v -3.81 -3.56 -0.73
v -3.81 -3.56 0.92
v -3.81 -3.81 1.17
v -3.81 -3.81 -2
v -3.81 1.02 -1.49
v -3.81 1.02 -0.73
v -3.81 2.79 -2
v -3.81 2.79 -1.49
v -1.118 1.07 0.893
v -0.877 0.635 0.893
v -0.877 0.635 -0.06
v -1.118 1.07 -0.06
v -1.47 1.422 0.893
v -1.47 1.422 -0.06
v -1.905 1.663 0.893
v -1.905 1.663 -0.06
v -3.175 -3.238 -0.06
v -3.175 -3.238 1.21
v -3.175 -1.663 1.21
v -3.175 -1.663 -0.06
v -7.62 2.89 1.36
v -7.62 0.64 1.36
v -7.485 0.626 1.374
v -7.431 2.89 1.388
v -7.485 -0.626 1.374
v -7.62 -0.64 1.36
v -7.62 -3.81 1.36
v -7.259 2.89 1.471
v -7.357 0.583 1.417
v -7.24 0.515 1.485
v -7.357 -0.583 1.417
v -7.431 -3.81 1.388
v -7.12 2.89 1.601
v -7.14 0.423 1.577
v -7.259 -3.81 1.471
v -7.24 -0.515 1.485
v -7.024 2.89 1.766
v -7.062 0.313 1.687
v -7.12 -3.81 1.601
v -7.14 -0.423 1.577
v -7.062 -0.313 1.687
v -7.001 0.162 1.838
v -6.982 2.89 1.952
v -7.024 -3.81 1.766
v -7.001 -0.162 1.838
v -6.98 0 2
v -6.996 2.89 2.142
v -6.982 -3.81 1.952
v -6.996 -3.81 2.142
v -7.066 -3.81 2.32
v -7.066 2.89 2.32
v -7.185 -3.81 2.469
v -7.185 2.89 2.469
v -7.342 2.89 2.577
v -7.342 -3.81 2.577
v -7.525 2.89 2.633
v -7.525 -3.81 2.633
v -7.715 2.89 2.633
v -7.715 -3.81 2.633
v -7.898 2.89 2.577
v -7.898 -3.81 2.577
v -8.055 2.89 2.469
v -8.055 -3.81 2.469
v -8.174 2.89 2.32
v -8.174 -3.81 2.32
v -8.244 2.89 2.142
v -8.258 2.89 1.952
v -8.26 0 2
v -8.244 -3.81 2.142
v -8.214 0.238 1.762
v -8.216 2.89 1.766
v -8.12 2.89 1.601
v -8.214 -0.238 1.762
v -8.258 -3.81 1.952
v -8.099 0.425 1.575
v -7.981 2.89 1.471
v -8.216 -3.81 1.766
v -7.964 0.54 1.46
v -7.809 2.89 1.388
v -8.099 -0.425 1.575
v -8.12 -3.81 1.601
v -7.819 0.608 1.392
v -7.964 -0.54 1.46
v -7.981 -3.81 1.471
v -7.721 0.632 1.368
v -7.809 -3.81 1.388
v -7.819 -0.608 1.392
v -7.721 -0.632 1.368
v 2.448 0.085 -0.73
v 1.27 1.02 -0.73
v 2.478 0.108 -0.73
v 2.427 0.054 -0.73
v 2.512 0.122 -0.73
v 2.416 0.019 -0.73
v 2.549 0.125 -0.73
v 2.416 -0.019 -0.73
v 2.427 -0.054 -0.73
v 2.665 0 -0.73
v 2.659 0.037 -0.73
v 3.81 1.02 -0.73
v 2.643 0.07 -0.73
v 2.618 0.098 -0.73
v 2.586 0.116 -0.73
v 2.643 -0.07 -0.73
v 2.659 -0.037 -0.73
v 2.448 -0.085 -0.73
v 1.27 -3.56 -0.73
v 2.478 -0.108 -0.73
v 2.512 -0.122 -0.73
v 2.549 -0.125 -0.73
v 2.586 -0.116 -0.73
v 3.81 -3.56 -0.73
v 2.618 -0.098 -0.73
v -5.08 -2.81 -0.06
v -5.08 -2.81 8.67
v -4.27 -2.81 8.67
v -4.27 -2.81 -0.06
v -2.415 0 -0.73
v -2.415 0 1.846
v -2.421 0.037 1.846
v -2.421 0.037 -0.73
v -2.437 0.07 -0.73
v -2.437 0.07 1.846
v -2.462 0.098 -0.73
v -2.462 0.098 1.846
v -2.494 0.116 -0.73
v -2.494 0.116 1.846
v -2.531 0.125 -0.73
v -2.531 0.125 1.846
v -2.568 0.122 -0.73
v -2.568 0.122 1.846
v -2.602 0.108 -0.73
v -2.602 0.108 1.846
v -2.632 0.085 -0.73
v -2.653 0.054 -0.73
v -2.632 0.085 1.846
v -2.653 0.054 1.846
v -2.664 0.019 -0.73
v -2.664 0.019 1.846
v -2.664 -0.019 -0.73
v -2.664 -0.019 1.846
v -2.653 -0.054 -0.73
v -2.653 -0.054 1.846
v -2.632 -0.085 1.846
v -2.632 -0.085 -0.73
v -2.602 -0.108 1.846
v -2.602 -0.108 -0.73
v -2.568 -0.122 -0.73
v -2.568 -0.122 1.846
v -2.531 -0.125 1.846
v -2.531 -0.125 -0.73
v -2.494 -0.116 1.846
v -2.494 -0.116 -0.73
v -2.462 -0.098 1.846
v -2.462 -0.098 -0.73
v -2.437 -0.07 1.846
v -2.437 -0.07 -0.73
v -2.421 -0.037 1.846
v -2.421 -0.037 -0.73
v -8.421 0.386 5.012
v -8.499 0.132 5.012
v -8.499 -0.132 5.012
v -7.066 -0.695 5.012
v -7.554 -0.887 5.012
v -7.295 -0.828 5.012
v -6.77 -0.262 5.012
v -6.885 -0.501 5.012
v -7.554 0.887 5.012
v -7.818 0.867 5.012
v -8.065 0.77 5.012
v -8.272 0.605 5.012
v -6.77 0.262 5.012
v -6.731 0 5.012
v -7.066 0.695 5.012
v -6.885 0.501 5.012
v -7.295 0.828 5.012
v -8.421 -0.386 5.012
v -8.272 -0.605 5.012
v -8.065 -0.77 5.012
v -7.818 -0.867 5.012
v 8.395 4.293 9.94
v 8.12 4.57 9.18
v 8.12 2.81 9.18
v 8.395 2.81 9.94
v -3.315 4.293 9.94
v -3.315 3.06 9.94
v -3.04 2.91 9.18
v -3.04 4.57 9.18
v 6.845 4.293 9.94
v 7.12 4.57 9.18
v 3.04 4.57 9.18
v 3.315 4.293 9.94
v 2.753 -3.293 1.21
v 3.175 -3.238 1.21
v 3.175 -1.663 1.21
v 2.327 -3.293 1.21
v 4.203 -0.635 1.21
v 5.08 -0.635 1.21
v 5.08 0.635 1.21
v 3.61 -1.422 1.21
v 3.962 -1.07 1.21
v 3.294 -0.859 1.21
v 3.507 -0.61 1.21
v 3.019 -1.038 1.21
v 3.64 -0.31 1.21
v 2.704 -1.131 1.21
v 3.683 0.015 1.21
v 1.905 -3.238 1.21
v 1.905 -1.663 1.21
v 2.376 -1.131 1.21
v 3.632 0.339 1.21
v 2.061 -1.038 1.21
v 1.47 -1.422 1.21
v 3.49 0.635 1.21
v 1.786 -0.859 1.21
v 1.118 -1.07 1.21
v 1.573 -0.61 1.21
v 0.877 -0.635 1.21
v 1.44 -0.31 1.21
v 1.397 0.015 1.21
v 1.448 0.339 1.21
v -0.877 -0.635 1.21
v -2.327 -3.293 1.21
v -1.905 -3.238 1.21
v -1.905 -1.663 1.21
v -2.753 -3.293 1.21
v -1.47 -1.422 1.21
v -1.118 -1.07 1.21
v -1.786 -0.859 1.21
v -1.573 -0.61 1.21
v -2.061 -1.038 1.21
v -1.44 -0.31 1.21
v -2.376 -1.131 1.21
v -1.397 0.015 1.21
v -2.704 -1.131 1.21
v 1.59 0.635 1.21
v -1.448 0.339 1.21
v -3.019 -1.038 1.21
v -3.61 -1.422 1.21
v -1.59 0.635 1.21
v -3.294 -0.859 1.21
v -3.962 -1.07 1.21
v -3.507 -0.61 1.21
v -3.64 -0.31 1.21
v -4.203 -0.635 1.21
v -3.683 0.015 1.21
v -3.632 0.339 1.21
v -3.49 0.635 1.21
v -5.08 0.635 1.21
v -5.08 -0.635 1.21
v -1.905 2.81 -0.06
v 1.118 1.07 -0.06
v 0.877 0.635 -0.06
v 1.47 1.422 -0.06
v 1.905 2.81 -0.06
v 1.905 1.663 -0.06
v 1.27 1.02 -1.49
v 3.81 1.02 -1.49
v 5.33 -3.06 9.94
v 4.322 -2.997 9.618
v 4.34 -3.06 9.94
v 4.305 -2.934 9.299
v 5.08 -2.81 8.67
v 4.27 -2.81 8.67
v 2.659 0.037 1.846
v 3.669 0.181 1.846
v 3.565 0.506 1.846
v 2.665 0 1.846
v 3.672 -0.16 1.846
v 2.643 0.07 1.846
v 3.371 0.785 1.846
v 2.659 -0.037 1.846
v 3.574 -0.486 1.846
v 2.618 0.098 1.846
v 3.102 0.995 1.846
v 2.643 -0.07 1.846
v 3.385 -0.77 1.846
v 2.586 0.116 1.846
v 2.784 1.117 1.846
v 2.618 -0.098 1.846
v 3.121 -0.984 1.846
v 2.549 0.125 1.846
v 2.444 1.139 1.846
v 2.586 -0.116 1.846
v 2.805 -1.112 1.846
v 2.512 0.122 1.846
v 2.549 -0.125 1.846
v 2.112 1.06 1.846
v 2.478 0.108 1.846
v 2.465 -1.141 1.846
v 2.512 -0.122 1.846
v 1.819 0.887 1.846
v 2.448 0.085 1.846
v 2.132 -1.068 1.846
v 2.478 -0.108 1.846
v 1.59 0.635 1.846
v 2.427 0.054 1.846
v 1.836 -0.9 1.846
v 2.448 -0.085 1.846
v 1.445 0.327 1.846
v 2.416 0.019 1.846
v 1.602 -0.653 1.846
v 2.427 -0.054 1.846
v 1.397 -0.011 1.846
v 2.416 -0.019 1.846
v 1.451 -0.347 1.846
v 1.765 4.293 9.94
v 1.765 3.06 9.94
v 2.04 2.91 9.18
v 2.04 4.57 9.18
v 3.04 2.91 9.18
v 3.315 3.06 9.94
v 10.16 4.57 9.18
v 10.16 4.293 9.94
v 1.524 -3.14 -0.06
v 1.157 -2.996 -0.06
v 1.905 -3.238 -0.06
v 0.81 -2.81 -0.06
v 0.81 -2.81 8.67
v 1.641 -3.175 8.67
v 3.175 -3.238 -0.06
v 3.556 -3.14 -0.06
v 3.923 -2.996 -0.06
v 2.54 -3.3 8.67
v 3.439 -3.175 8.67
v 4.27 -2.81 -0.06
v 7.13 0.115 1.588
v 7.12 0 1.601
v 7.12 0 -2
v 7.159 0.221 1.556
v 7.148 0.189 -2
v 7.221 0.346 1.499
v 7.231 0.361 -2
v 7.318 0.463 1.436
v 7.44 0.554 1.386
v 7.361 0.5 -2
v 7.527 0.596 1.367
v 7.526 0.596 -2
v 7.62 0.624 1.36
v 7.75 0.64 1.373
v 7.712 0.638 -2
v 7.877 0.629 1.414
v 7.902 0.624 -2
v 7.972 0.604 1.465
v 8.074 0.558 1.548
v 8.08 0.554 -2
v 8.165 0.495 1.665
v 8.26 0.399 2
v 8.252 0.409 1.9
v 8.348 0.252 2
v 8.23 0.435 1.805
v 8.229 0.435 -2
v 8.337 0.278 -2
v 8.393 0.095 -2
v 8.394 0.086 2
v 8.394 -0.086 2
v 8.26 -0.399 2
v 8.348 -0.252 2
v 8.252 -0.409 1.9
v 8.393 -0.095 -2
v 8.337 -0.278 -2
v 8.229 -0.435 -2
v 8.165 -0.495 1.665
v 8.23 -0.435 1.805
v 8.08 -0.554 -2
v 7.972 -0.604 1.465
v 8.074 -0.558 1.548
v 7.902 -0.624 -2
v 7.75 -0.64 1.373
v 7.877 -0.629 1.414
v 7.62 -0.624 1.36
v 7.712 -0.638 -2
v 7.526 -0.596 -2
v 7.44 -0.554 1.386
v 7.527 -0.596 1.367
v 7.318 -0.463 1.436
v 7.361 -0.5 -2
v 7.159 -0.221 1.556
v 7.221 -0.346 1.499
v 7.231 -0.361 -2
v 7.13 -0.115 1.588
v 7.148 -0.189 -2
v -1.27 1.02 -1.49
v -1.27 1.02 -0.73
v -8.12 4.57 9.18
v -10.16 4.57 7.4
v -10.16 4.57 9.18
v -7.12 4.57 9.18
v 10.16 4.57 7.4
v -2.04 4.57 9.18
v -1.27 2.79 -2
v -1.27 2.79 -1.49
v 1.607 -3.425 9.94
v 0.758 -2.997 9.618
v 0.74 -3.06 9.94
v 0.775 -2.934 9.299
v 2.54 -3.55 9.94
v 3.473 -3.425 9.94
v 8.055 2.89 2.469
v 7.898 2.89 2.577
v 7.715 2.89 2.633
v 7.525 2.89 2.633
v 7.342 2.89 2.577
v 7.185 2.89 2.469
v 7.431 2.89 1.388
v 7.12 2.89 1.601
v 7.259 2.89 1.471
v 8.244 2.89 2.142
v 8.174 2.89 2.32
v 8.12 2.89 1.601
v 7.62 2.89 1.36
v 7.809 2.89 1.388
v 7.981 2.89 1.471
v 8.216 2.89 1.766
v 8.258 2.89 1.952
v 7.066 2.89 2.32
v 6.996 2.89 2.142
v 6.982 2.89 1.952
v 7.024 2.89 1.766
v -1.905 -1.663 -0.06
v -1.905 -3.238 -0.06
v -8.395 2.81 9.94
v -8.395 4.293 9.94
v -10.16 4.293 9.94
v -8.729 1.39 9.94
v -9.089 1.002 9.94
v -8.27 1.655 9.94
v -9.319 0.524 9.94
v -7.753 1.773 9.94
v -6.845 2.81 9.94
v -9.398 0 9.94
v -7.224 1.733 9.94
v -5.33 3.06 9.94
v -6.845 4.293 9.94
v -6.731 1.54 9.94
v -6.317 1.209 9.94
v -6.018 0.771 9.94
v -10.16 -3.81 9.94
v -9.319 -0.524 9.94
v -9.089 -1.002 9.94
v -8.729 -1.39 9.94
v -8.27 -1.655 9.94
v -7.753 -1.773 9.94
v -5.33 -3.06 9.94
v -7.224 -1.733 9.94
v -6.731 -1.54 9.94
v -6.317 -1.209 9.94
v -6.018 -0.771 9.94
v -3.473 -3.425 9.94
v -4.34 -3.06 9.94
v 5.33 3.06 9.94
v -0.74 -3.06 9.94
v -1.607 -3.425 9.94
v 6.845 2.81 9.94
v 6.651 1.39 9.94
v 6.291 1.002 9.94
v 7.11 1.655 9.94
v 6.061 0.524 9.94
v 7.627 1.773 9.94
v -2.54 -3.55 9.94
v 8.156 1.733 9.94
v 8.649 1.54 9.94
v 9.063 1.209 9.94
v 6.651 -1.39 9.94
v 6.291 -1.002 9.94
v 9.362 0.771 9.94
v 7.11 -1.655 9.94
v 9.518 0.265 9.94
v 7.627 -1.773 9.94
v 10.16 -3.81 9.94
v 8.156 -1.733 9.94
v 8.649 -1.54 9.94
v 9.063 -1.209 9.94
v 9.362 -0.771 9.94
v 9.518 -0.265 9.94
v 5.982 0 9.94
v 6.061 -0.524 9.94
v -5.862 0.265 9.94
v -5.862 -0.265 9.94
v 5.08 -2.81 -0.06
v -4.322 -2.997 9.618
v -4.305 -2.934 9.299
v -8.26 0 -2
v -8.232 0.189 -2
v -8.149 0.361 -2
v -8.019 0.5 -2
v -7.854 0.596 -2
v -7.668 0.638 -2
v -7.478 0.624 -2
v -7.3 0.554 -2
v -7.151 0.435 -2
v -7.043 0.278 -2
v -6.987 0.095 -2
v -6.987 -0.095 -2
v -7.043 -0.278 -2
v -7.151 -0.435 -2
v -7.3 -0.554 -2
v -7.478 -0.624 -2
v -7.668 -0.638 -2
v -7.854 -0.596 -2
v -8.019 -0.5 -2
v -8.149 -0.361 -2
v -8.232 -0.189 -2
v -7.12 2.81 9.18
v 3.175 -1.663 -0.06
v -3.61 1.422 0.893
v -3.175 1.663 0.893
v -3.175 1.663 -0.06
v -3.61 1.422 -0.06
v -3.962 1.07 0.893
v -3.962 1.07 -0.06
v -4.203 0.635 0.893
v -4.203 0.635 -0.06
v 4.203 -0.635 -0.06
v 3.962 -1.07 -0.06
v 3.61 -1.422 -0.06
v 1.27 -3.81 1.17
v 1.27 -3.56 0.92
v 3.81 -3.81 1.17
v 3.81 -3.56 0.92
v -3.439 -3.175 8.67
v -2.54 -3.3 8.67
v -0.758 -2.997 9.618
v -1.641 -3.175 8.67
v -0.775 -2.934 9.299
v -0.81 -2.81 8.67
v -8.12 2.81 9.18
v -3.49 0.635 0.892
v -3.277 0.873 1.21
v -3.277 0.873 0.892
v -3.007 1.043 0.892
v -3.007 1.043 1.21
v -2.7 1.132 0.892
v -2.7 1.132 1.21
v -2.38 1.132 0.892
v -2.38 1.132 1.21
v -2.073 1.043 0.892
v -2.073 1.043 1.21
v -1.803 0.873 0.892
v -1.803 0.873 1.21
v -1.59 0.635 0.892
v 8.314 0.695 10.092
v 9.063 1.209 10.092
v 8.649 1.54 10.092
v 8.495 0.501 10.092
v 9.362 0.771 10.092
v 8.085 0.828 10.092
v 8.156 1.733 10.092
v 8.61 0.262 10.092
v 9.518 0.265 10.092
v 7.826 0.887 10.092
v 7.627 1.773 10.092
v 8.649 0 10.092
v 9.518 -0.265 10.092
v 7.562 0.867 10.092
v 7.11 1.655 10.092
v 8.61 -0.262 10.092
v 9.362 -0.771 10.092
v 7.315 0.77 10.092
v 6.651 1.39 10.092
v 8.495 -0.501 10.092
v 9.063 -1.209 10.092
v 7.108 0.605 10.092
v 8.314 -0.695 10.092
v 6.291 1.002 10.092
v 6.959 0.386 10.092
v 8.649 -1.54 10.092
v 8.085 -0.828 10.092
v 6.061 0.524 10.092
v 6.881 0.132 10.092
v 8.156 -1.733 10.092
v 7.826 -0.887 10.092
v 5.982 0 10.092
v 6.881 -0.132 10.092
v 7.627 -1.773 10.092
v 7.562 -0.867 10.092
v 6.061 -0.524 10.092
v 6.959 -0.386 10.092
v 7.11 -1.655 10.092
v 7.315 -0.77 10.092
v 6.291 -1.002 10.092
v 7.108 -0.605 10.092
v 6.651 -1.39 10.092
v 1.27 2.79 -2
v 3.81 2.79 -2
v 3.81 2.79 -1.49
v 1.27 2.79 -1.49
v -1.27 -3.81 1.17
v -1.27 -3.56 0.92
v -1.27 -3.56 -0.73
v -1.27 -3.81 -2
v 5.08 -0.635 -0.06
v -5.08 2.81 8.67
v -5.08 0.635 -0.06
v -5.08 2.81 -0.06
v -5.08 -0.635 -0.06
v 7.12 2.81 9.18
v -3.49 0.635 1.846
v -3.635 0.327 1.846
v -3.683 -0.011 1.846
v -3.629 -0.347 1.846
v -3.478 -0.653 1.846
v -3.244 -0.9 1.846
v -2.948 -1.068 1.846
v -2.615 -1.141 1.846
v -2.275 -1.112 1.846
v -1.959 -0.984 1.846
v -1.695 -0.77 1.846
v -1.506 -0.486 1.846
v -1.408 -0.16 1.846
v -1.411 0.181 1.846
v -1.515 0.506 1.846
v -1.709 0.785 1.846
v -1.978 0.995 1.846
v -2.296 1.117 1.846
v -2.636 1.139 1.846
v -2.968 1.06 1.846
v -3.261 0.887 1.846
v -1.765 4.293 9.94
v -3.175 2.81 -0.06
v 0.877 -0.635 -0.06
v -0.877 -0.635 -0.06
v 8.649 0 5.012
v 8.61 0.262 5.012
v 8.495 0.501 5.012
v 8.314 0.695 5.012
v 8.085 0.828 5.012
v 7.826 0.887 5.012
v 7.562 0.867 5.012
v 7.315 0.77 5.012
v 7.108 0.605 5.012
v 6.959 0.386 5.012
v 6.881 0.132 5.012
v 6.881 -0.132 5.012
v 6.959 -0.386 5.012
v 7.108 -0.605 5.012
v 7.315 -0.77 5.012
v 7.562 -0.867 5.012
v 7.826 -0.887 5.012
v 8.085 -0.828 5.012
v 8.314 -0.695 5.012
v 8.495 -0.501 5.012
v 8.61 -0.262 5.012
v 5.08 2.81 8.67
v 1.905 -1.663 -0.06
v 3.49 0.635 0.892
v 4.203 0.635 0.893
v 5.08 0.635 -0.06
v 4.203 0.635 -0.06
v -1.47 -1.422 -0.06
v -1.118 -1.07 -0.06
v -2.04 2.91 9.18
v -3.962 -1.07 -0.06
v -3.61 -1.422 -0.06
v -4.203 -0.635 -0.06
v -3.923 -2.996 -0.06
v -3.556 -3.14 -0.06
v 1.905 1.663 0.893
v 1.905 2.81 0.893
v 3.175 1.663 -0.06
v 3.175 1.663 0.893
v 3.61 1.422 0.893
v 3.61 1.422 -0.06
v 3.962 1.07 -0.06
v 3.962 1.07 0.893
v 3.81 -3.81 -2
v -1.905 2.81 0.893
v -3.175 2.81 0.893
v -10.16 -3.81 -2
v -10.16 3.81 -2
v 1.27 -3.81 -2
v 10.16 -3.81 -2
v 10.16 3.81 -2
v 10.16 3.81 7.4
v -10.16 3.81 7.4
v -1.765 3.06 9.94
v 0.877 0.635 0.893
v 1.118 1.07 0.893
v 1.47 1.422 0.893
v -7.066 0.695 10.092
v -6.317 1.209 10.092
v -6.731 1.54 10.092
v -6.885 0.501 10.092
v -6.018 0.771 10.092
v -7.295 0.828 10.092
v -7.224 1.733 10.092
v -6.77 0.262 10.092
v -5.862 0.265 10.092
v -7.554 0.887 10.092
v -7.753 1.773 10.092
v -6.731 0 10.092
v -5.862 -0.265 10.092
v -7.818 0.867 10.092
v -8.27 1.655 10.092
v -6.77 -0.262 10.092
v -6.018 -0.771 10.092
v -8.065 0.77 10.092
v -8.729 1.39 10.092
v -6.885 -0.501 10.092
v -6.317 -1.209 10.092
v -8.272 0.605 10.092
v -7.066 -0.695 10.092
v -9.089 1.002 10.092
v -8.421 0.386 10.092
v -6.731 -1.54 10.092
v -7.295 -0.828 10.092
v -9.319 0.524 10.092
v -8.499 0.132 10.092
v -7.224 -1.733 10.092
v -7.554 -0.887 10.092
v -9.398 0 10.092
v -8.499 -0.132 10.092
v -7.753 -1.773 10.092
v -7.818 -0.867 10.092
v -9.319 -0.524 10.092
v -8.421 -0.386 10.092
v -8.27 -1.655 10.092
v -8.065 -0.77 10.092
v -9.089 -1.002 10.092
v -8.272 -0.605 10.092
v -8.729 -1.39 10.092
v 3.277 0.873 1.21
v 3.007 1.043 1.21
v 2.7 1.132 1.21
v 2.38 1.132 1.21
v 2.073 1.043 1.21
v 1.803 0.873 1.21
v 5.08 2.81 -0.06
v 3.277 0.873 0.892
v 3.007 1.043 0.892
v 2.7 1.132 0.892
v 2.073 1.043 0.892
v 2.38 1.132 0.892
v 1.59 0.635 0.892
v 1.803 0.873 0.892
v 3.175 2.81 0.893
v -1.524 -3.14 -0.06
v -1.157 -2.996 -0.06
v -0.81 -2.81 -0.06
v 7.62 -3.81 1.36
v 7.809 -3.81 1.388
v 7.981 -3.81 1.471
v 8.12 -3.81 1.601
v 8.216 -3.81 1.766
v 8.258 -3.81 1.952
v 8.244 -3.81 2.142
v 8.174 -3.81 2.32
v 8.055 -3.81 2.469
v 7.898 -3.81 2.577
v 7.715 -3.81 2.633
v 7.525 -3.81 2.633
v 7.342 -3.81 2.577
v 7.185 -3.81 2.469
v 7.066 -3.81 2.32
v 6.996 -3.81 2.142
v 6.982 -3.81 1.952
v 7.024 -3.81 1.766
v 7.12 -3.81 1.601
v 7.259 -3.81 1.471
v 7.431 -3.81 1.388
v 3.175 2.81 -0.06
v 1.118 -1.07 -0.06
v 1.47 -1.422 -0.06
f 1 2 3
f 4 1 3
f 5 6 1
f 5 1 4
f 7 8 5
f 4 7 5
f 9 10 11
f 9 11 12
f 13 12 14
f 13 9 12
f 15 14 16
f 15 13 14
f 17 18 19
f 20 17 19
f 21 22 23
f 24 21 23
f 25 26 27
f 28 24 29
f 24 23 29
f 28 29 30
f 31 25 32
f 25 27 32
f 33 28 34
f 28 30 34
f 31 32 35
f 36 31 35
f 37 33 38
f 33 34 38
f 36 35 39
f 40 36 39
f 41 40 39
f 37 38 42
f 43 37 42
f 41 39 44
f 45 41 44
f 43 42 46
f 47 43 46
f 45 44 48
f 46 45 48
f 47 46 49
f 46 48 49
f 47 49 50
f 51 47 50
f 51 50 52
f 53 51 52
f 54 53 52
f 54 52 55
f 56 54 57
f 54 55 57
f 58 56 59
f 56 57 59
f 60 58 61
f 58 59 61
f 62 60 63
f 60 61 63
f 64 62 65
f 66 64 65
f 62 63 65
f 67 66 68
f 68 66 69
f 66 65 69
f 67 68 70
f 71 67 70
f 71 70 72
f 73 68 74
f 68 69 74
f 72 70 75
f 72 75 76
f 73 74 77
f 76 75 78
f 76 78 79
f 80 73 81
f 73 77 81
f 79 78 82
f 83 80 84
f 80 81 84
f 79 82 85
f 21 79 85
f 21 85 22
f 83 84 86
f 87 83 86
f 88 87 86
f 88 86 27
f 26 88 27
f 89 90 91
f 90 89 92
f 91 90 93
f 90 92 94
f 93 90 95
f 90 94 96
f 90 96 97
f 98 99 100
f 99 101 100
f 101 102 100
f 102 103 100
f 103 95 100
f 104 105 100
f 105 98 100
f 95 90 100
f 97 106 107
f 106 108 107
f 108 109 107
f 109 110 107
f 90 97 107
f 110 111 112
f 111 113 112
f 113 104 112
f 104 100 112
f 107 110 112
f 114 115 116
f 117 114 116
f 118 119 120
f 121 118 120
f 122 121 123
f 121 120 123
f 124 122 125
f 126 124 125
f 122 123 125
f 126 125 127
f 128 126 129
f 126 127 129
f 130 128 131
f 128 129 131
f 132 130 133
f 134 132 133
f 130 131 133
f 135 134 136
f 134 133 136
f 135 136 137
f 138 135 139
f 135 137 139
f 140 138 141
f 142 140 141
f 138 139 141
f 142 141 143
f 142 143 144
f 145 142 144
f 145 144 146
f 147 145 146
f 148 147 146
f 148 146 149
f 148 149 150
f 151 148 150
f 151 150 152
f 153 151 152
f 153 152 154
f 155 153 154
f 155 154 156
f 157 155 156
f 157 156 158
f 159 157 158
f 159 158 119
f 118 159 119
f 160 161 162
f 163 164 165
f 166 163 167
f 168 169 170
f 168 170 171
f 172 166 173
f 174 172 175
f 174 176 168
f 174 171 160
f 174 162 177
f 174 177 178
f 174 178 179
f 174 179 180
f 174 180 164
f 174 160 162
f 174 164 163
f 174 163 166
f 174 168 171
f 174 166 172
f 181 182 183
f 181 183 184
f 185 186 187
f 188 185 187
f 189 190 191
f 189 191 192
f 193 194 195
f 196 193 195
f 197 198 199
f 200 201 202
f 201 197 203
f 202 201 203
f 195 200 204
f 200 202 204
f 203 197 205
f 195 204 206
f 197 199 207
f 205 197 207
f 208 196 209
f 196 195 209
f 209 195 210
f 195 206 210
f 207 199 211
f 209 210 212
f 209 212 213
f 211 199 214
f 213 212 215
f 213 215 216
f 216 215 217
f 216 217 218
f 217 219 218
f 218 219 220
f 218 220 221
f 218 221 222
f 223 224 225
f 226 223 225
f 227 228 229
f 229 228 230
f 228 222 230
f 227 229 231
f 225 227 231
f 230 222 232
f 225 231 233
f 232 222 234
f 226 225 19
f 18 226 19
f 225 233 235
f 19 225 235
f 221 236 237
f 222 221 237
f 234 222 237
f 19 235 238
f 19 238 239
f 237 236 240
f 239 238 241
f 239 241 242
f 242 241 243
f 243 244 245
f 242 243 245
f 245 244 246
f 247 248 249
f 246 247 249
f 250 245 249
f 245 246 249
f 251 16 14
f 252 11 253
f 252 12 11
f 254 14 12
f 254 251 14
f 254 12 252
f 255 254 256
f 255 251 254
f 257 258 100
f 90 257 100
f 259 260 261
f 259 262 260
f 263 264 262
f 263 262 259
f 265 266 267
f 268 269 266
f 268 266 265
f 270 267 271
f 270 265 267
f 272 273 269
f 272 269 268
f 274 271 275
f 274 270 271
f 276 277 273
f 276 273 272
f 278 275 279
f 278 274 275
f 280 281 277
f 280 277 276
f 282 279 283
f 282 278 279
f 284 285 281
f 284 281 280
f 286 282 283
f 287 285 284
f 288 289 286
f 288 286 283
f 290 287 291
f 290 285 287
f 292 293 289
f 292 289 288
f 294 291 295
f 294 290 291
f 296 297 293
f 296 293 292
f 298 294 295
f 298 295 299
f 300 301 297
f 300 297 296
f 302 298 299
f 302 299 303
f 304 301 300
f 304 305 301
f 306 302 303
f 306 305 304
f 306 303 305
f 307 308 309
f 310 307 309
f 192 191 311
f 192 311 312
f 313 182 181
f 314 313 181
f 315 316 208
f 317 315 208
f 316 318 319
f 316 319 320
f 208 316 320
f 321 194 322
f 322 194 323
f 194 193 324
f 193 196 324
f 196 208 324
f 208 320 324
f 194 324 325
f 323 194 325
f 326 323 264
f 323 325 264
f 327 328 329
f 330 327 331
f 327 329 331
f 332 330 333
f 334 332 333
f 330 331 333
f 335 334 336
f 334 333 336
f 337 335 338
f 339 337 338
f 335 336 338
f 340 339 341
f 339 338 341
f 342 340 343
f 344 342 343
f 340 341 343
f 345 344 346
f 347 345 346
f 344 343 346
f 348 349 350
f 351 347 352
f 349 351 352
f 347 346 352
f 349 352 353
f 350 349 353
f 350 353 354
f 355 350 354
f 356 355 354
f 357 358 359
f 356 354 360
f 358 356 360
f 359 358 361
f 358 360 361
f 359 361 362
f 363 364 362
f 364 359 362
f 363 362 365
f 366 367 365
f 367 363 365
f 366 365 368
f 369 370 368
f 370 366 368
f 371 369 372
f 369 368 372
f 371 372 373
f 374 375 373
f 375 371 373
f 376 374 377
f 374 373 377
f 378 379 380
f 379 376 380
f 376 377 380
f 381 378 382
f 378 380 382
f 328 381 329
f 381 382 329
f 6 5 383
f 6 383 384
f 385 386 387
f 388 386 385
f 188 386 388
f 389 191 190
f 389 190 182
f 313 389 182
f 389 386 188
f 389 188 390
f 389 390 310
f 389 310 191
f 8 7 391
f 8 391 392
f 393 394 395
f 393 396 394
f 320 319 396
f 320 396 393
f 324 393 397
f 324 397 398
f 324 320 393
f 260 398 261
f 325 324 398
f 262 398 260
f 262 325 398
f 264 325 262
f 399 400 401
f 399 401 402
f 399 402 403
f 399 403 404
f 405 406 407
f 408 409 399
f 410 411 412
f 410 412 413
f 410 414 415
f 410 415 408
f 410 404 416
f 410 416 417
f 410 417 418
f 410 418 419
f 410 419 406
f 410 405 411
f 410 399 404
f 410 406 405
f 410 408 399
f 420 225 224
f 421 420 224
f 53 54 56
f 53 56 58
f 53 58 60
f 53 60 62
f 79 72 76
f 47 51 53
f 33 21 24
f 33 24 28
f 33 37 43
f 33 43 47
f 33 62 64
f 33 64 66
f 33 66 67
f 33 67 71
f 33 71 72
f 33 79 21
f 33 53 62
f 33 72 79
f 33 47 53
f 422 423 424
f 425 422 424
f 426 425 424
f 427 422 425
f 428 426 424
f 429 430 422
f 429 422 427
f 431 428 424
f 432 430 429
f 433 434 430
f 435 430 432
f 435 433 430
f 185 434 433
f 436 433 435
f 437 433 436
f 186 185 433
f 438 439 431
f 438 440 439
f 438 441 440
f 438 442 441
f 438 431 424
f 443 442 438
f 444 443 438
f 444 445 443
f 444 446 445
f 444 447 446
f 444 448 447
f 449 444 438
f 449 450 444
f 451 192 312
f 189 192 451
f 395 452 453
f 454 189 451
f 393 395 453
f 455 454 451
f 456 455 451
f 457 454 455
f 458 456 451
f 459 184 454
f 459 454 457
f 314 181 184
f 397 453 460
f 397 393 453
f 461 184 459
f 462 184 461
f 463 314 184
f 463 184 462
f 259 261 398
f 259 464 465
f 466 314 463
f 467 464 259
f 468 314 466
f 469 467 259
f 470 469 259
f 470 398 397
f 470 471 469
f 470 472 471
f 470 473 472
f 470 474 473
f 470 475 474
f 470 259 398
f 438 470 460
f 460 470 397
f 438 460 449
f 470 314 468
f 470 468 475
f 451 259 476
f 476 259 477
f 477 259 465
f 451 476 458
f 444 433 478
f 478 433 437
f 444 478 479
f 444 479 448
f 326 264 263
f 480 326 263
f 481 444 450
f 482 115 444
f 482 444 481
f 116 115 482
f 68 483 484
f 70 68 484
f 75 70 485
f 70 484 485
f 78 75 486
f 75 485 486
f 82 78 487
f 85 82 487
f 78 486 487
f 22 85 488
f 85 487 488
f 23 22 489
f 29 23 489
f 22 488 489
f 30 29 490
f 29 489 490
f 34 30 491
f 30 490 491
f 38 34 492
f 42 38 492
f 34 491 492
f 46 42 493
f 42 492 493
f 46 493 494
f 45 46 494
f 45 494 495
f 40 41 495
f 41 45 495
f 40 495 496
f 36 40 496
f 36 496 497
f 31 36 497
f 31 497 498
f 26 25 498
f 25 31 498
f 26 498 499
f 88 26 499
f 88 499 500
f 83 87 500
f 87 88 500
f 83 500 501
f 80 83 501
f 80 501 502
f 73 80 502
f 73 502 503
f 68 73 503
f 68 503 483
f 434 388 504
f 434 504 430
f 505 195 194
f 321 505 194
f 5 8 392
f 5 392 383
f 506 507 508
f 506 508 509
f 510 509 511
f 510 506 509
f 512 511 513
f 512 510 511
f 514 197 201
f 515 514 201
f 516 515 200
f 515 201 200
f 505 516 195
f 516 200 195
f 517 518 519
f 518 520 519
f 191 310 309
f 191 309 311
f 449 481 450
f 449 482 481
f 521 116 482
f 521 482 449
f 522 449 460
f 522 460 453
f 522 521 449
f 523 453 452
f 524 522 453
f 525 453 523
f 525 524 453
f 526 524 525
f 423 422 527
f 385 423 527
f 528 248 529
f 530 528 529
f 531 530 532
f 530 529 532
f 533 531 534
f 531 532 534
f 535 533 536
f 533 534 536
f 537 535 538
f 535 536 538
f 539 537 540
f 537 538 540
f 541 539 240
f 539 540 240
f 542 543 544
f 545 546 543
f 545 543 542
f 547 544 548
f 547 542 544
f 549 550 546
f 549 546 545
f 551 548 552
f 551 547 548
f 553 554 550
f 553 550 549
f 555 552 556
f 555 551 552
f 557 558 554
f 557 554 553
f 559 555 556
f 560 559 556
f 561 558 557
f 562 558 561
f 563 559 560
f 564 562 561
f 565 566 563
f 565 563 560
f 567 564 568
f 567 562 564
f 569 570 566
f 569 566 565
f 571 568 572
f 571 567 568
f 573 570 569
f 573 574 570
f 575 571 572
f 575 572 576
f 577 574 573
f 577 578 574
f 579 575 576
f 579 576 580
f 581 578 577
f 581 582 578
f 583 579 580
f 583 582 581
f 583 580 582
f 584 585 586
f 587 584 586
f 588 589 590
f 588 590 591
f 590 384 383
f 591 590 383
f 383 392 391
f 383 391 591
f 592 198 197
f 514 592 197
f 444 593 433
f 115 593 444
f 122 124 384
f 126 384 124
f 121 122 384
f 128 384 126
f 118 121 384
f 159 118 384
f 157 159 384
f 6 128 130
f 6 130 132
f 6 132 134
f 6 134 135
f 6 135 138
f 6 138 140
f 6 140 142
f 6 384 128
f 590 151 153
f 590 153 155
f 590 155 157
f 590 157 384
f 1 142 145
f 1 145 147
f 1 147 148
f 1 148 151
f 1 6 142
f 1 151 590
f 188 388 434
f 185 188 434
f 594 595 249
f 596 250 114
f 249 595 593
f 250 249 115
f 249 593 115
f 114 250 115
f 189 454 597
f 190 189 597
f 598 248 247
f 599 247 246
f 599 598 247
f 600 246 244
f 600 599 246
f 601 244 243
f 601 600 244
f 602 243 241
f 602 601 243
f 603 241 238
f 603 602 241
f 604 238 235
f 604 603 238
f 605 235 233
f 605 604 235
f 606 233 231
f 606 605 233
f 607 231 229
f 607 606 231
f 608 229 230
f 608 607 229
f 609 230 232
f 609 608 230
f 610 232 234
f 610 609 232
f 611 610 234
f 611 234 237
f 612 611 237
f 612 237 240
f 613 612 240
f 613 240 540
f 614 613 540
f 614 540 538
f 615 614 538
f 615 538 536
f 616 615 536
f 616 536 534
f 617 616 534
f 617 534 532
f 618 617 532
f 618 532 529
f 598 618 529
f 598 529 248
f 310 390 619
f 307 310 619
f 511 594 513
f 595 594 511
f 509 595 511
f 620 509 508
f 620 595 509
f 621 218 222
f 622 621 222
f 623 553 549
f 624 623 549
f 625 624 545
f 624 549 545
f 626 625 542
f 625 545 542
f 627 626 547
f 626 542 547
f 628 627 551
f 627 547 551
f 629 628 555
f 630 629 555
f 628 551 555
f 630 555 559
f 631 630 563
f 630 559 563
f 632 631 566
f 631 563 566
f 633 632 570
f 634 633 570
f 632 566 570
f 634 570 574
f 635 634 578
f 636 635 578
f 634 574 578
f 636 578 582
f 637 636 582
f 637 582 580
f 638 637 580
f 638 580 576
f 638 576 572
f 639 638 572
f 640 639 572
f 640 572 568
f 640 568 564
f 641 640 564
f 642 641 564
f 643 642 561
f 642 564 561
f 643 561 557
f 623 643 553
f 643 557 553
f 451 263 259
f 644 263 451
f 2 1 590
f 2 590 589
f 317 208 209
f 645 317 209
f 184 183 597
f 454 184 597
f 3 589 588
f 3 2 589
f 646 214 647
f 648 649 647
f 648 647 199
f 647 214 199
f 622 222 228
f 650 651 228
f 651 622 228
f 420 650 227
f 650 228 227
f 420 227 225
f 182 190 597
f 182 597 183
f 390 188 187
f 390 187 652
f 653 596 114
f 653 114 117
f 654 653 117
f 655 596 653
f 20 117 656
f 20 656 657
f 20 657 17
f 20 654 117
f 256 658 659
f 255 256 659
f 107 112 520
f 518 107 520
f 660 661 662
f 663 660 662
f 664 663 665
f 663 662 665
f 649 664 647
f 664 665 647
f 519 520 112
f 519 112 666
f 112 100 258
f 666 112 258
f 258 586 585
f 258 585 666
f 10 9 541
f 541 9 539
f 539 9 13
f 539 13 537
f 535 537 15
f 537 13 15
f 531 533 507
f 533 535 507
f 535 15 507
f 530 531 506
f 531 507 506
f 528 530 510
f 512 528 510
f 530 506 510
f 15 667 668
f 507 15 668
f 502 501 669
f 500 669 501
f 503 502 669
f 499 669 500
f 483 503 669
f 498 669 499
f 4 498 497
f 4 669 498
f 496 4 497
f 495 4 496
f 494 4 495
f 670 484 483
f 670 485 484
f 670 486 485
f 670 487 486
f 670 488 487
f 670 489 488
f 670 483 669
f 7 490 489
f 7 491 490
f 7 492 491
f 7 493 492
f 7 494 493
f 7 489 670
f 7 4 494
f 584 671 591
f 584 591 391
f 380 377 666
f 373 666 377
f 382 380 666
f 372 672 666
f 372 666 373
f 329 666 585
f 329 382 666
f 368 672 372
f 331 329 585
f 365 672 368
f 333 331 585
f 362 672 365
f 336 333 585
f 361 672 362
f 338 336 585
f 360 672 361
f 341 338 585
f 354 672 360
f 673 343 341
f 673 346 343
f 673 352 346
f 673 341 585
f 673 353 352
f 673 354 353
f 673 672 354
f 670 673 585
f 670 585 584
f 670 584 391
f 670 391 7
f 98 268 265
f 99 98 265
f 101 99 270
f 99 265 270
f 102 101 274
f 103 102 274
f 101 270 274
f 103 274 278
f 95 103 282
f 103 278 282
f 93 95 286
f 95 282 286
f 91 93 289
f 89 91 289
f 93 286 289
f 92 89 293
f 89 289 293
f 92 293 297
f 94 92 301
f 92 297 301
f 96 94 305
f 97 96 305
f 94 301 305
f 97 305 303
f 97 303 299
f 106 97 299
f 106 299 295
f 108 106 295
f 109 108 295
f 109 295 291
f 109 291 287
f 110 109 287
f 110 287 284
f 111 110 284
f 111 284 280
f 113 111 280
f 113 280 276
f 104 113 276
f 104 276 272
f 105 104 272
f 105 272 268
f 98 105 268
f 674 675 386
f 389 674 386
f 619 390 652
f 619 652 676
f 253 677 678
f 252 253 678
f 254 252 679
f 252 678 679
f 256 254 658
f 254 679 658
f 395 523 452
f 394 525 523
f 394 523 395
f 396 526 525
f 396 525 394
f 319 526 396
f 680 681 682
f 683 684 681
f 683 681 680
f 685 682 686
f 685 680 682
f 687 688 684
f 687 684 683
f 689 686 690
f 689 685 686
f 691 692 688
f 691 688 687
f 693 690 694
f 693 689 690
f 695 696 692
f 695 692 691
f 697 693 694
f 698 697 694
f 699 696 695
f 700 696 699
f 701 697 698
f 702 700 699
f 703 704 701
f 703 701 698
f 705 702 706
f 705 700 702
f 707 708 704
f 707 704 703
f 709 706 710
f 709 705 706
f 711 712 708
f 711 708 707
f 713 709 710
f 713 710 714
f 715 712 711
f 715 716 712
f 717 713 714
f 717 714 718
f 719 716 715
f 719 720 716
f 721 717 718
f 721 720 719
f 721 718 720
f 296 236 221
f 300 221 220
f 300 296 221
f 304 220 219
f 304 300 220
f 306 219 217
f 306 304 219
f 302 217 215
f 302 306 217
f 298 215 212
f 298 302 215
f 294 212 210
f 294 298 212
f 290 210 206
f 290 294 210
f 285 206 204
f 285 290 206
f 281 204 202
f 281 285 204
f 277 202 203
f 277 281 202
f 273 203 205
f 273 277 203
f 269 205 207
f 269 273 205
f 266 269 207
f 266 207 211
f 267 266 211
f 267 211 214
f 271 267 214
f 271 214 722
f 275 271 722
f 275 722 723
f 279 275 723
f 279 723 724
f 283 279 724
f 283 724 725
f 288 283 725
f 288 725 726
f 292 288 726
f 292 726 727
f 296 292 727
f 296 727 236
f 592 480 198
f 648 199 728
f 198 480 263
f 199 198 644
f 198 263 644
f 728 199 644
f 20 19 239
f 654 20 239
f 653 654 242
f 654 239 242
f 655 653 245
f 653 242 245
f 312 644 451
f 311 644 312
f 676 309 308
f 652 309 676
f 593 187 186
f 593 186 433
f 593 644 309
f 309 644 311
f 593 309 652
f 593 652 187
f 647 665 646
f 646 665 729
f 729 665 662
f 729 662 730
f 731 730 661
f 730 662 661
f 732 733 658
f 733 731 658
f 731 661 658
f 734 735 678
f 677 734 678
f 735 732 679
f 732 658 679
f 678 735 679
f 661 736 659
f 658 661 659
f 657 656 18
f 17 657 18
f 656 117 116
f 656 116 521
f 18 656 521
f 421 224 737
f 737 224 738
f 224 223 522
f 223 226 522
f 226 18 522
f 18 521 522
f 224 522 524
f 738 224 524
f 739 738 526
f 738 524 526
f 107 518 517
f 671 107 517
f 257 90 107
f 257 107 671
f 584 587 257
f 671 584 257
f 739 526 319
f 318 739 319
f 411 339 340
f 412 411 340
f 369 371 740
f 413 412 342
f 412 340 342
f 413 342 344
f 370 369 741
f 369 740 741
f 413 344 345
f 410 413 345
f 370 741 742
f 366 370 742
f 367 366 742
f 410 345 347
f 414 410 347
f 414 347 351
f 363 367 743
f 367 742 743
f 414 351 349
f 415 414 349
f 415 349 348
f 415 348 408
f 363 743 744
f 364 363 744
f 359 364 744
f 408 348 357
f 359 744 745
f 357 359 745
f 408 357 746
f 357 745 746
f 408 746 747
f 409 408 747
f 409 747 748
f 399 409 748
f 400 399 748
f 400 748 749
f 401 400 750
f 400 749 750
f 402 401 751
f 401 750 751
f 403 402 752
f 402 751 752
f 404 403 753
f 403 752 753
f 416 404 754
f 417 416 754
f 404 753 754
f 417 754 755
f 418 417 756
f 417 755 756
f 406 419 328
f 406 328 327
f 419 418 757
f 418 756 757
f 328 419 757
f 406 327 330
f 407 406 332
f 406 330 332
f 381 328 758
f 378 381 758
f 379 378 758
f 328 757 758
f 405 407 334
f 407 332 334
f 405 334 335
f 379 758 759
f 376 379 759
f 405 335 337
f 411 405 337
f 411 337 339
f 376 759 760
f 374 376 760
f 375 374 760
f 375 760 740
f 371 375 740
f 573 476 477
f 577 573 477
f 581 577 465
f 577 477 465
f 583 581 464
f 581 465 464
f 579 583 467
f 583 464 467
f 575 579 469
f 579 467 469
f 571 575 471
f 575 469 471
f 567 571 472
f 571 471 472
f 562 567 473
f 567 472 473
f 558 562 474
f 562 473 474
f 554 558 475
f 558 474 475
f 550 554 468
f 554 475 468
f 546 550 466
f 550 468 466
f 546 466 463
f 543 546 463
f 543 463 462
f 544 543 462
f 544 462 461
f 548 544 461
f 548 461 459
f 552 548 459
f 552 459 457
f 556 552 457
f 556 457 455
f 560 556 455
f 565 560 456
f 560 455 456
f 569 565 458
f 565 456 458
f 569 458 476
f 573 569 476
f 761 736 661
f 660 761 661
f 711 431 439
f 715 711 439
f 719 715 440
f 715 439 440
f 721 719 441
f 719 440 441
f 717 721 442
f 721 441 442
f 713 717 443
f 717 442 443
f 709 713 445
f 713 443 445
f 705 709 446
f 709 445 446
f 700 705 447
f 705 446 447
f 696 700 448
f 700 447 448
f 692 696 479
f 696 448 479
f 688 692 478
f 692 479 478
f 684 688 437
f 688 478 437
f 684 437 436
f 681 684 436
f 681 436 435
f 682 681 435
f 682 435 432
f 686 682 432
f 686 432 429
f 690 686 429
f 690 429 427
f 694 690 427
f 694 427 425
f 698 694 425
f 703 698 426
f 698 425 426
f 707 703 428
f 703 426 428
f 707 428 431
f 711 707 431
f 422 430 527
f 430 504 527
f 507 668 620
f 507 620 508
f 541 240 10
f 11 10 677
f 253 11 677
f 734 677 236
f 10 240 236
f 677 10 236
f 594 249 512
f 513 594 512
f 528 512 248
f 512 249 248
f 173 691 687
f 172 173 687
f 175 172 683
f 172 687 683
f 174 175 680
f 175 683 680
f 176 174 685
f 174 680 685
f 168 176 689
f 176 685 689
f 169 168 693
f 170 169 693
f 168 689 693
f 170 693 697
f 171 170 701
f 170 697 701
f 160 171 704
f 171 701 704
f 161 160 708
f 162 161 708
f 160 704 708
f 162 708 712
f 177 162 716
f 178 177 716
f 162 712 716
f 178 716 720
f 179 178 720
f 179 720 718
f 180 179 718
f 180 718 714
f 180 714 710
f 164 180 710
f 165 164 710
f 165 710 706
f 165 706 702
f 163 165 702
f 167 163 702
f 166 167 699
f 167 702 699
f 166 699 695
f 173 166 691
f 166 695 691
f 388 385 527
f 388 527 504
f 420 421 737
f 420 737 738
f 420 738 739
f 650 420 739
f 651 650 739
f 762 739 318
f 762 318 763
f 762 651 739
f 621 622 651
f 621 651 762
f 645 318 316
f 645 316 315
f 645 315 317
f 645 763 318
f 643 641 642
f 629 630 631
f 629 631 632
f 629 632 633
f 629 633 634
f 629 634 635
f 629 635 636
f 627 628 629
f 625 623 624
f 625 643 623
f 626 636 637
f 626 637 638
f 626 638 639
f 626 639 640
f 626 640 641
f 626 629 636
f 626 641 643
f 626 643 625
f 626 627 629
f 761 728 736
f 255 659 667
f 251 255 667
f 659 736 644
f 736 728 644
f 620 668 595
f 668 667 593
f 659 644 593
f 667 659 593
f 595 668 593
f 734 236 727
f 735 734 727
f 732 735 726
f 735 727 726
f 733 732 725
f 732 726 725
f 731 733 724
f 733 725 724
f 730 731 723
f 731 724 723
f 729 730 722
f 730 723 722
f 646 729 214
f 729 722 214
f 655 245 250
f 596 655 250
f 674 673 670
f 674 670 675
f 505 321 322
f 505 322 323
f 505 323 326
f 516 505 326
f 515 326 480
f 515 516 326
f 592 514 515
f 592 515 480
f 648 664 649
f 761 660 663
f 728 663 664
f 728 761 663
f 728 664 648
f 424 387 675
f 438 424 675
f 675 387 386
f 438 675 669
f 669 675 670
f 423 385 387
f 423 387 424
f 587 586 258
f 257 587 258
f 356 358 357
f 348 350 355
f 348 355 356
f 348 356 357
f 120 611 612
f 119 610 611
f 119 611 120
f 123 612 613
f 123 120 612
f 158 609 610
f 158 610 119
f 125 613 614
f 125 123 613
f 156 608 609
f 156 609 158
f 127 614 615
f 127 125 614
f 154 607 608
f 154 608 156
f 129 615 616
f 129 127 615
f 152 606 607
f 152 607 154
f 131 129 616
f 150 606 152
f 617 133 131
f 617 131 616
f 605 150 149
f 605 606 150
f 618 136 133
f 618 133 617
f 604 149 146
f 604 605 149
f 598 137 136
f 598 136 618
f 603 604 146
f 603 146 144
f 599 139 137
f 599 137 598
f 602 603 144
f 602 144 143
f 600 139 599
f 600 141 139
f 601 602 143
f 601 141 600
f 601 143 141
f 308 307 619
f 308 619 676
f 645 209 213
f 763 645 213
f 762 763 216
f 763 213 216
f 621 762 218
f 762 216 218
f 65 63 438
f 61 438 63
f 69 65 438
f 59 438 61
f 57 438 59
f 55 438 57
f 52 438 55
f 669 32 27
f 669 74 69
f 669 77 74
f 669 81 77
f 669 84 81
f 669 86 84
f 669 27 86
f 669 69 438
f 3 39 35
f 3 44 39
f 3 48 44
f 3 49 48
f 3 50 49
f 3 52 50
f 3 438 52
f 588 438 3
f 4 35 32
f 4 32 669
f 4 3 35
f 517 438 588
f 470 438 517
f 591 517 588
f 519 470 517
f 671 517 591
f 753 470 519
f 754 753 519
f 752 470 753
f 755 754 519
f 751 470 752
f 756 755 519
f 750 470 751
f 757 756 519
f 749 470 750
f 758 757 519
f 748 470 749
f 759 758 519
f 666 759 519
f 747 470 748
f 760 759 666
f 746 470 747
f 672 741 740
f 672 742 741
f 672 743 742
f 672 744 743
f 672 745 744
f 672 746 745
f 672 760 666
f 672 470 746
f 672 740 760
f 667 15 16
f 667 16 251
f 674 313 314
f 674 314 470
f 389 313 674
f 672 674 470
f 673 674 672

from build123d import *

# Parameters (mm, degrees)
BOSS_EXTRUDE1_DEPTH = 10.16
CUT_EXTRUDE1_DEPTH  = 10
CHAMFER1_SIZE       = 0.25
CHAMFER1_SIZE2      = 1.27
SKETCH3_R           = 1.778
BOSS_EXTRUDE2_DEPTH = 0.152
SKETCH4_R           = 0.889
CUT_EXTRUDE2_DEPTH  = 5.08
BOSS_EXTRUDE3_START = 0.9525
BOSS_EXTRUDE3_DEPTH = 0.9525
BOSS_EXTRUDE4_START = 0.318
BOSS_EXTRUDE4_DEPTH = 0.318
BOSS_EXTRUDE5_START = 0.635
SKETCH9_R           = 1.143
BOSS_EXTRUDE5_DEPTH = 0.635
CUT_EXTRUDE3_REACH  = 18.592
SKETCH11_R          = 0.64
CUT_EXTRUDE4_DEPTH  = 6.7
SKETCH12_R          = 0.64
CUT_EXTRUDE6_DEPTH  = 4
CUT_EXTRUDE7_DEPTH  = 1.27
SKETCH15_R          = 0.125
CUT_EXTRUDE8_DEPTH  = 14.860565005


with BuildPart() as part:
    # Sketch1 → Boss-Extrude1 (new, symmetric)
    with BuildSketch(Plane(origin=(0, 0, 0), x_dir=(0, 0, -1), z_dir=(1, 0, 0))):
        Polygon((-9.94, -3.81), (2, -3.81), (2, 3.81), (-7.4, 3.81), (-7.4, 4.57), (-9.18, 4.57), (-9.94, 4.293), align=None)
    extrude(amount=BOSS_EXTRUDE1_DEPTH, both=True)

    # Sketch2 → Cut-Extrude1 (cut)
    with BuildSketch(Plane.XY.offset(9.94)):
        with BuildLine():
            Line((-0.809711007, -2.81), (0.809711007, -2.81))
            ThreePointArc((0.809711007, -2.81), (2.54, -3.3), (4.270288993, -2.81))
            Line((4.270288993, -2.81), (5.08, -2.81))
            Line((5.08, -2.81), (5.08, 2.81))
            Line((5.08, 2.81), (-5.08, 2.81))
            Line((-5.08, 2.81), (-5.08, -2.81))
            Line((-5.08, -2.81), (-4.270288993, -2.81))
            ThreePointArc((-4.270288993, -2.81), (-2.54, -3.3), (-0.809711007, -2.81))
        make_face()
    extrude(amount=-CUT_EXTRUDE1_DEPTH, mode=Mode.SUBTRACT)

    # Chamfer1
    chamfer1_edges = [part.edges().sort_by_distance(p)[0] for p in [
        (-5.08, 0, 9.94),
        (-4.675144497, -2.81, 9.94),
        (-2.54, -3.3, 9.94),
        (0, -2.81, 9.94),
        (2.54, -3.3, 9.94),
        (4.675144497, -2.81, 9.94),
        (5.08, 0, 9.94),
        (0, 2.81, 9.94),
    ]]
    chamfer1_side = [part.faces().sort_by_distance(p)[0] for p in [
        (-9.941239627, 0.2415, 9.94),
    ]]
    chamfer(chamfer1_edges, length=CHAMFER1_SIZE, length2=CHAMFER1_SIZE2, reference=chamfer1_side[0])

    # Sketch3 → Boss-Extrude2 (add)
    with BuildSketch(Plane.XY.offset(9.94)):
        with Locations(Location((-7.62, 0, 0), (0, 0, 180))):
            Circle(SKETCH3_R)
        with Locations(Location((7.76, 0, 0), (0, 0, 180))):
            Circle(SKETCH3_R)
    extrude(amount=BOSS_EXTRUDE2_DEPTH)

    # Sketch4 → Cut-Extrude2 (cut)
    with BuildSketch(Plane.XY.offset(10.092)):
        with Locations((-7.62, 0)):
            Circle(SKETCH4_R)
        with Locations((7.76, 0)):
            Circle(SKETCH4_R)
    extrude(amount=-CUT_EXTRUDE2_DEPTH, mode=Mode.SUBTRACT)

    # Sketch5 → Boss-Extrude3 (add)
    with BuildSketch(Plane.XY.offset(-0.06).offset(BOSS_EXTRUDE3_START)):
        with BuildLine():
            Line((-3.175, 2.81), (-3.175, 1.662881535))
            ThreePointArc((-3.175, 1.662881535), (-3.798650071, 1.258650071), (-4.202881535, 0.635))
            Line((-4.202881535, 0.635), (-5.08, 0.635))
            Line((-5.08, 0.635), (-5.08, -0.635))
            Line((-5.08, -0.635), (-4.202881535, -0.635))
            ThreePointArc((-4.202881535, -0.635), (-3.798650071, -1.258650071), (-3.175, -1.662881535))
            Line((-3.175, -1.662881535), (-3.175, -3.238329044))
            ThreePointArc((-3.175, -3.238329044), (-2.54, -3.3), (-1.905, -3.238329044))
            Line((-1.905, -3.238329044), (-1.905, -1.662881535))
            ThreePointArc((-1.905, -1.662881535), (-1.281349929, -1.258650071), (-0.877118465, -0.635))
            Line((-0.877118465, -0.635), (0, -0.635))
            Line((0, -0.635), (0, 0.635))
            Line((0, 0.635), (-0.877118465, 0.635))
            ThreePointArc((-0.877118465, 0.635), (-1.281349929, 1.258650071), (-1.905, 1.662881535))
            Line((-1.905, 1.662881535), (-1.905, 2.81))
            Line((-1.905, 2.81), (-3.175, 2.81))
        make_face()
    boss_extrude3 = extrude(amount=-BOSS_EXTRUDE3_DEPTH)

    # Mirror1: Boss-Extrude3 across plane
    add(boss_extrude3.mirror(Plane(origin=(0, 0, 0), x_dir=(0, 0, 1), z_dir=(1, 0, 0))))

    # Sketch8 → Boss-Extrude4 (add)
    with BuildSketch(Plane.XY.offset(0.8925).offset(BOSS_EXTRUDE4_START)):
        with BuildLine():
            Line((-4.202881535, 0.635), (-3.490380976, 0.635))
            ThreePointArc((-3.490380976, 0.635), (-2.54, 1.143), (-1.589619024, 0.635))
            Line((-1.589619024, 0.635), (-0.877118465, 0.635))
            Line((-0.877118465, 0.635), (0.877118465, 0.635))
            Line((0.877118465, 0.635), (1.589619024, 0.635))
            ThreePointArc((1.589619024, 0.635), (2.54, 1.143), (3.490380976, 0.635))
            Line((3.490380976, 0.635), (4.202881535, 0.635))
            Line((4.202881535, 0.635), (5.08, 0.635))
            Line((5.08, 0.635), (5.08, -0.635))
            Line((5.08, -0.635), (4.202881535, -0.635))
            ThreePointArc((4.202881535, -0.635), (3.798650071, -1.258650071), (3.175, -1.662881535))
            Line((3.175, -1.662881535), (3.175, -3.238329044))
            ThreePointArc((3.175, -3.238329044), (2.54, -3.3), (1.905, -3.238329044))
            Line((1.905, -3.238329044), (1.905, -1.662881535))
            ThreePointArc((1.905, -1.662881535), (1.281349929, -1.258650071), (0.877118465, -0.635))
            Line((0.877118465, -0.635), (-0.877118465, -0.635))
            ThreePointArc((-0.877118465, -0.635), (-1.281349929, -1.258650071), (-1.905, -1.662881535))
            Line((-1.905, -1.662881535), (-1.905, -3.238329044))
            ThreePointArc((-1.905, -3.238329044), (-2.54, -3.3), (-3.175, -3.238329044))
            Line((-3.175, -3.238329044), (-3.175, -1.662881535))
            ThreePointArc((-3.175, -1.662881535), (-3.798650071, -1.258650071), (-4.202881535, -0.635))
            Line((-4.202881535, -0.635), (-5.08, -0.635))
            Line((-5.08, -0.635), (-5.08, 0.635))
            Line((-5.08, 0.635), (-4.202881535, 0.635))
        make_face()
    extrude(amount=-BOSS_EXTRUDE4_DEPTH)

    # Sketch9 → Boss-Extrude5 (add)
    with BuildSketch(Plane.XY.offset(1.2105).offset(BOSS_EXTRUDE5_START)):
        with Locations(Location((-2.54, 0, 0), (0, 0, 146.251011404))):
            Circle(SKETCH9_R)
        with Locations(Location((2.54, 0, 0), (0, 0, 146.251011404))):
            Circle(SKETCH9_R)
    extrude(amount=-BOSS_EXTRUDE5_DEPTH)

    # Cut-Extrude3: up to this face of the body (flat: up to its plane)
    cut_extrude3_end = Plane(part.part.faces().sort_by_distance((0, 2.81, 4.414046423))[0])
    # Sketch10 → Cut-Extrude3 (cut, up to the picked face)
    with BuildSketch(Plane(origin=(0, 4.57, 0), x_dir=(1, 0, 0), z_dir=(0, 1, 0)), mode=Mode.PRIVATE) as cut_extrude3_sk1:
        Polygon((-2.04, -9.18), (-1.765, -9.94), (-3.315, -9.94), (-3.04, -9.18), align=None)
    cut_extrude3_tool1 = split(extrude(cut_extrude3_sk1.sketch, amount=-CUT_EXTRUDE3_REACH, mode=Mode.PRIVATE), bisect_by=cut_extrude3_end, keep=Keep.BOTH, mode=Mode.PRIVATE)
    # Sketch10 → Cut-Extrude3 (cut, up to the picked face)
    with BuildSketch(Plane(origin=(0, 4.57, 0), x_dir=(1, 0, 0), z_dir=(0, 1, 0)), mode=Mode.PRIVATE) as cut_extrude3_sk2:
        Polygon((-8.395, -9.94), (-8.12, -9.18), (-7.12, -9.18), (-6.845, -9.94), align=None)
    cut_extrude3_tool2 = split(extrude(cut_extrude3_sk2.sketch, amount=-CUT_EXTRUDE3_REACH, mode=Mode.PRIVATE), bisect_by=cut_extrude3_end, keep=Keep.BOTH, mode=Mode.PRIVATE)
    # Sketch10 → Cut-Extrude3 (cut, up to the picked face)
    with BuildSketch(Plane(origin=(0, 4.57, 0), x_dir=(1, 0, 0), z_dir=(0, 1, 0)), mode=Mode.PRIVATE) as cut_extrude3_sk3:
        Polygon((3.04, -9.18), (3.315, -9.94), (1.765, -9.94), (2.04, -9.18), align=None)
    cut_extrude3_tool3 = split(extrude(cut_extrude3_sk3.sketch, amount=-CUT_EXTRUDE3_REACH, mode=Mode.PRIVATE), bisect_by=cut_extrude3_end, keep=Keep.BOTH, mode=Mode.PRIVATE)
    # Sketch10 → Cut-Extrude3 (cut, up to the picked face)
    with BuildSketch(Plane(origin=(0, 4.57, 0), x_dir=(1, 0, 0), z_dir=(0, 1, 0)), mode=Mode.PRIVATE) as cut_extrude3_sk4:
        Polygon((8.12, -9.18), (8.395, -9.94), (6.845, -9.94), (7.12, -9.18), align=None)
    cut_extrude3_tool4 = split(extrude(cut_extrude3_sk4.sketch, amount=-CUT_EXTRUDE3_REACH, mode=Mode.PRIVATE), bisect_by=cut_extrude3_end, keep=Keep.BOTH, mode=Mode.PRIVATE)
    add(cut_extrude3_tool1.solids().sort_by(Axis((-2.54, 4.57, 9.58732), (0, -1, 0)))[0], mode=Mode.SUBTRACT)
    add(cut_extrude3_tool2.solids().sort_by(Axis((-7.62, 4.57, 9.58732), (0, -1, 0)))[0], mode=Mode.SUBTRACT)
    add(cut_extrude3_tool3.solids().sort_by(Axis((2.54, 4.57, 9.58732), (0, -1, 0)))[0], mode=Mode.SUBTRACT)
    add(cut_extrude3_tool4.solids().sort_by(Axis((7.62, 4.57, 9.58732), (0, -1, 0)))[0], mode=Mode.SUBTRACT)

    # Sketch11 → Cut-Extrude4 (cut)
    with BuildSketch(Plane.XZ.offset(3.81)):
        with Locations(Location((-7.62, 2, 0), (0, 0, 270))):
            Circle(SKETCH11_R)
        with Locations(Location((7.62, 2, 0), (0, 0, 270))):
            Circle(SKETCH11_R)
    extrude(amount=-CUT_EXTRUDE4_DEPTH, mode=Mode.SUBTRACT)

    # Sketch12 → Cut-Extrude6 (cut)
    with BuildSketch(Plane(origin=(0, 0, -2), x_dir=(-1, 0, 0), z_dir=(0, 0, -1))):
        with Locations((-7.76, 0)):
            Circle(SKETCH12_R)
        with Locations((7.62, 0)):
            Circle(SKETCH12_R)
    extrude(amount=-CUT_EXTRUDE6_DEPTH, mode=Mode.SUBTRACT)

    # Sketch13 → Cut-Extrude7 (cut, symmetric)
    with BuildSketch(Plane(origin=(2.54, 0, 0), x_dir=(0, 0, -1), z_dir=(1, 0, 0))):
        Polygon((2, -3.81), (2, 2.79), (1.49, 2.79), (1.49, 1.02), (0.73, 1.02), (0.73, -3.56), (-0.92, -3.56), (-1.17, -3.81), align=None)
    cut_extrude7 = extrude(amount=CUT_EXTRUDE7_DEPTH, both=True, mode=Mode.SUBTRACT)

    # Mirror2: Cut-Extrude7 across plane
    add(cut_extrude7.mirror(Plane(origin=(0, 0, 0), x_dir=(0, 0, 1), z_dir=(1, 0, 0))), mode=Mode.SUBTRACT)

    # Sketch15 → Cut-Extrude8 (cut, through all)
    with BuildSketch(Plane.XY.offset(1.8455)):
        with Locations((-2.54, 0)):
            Circle(SKETCH15_R)
        with Locations((2.54, 0)):
            Circle(SKETCH15_R)
    extrude(amount=-CUT_EXTRUDE8_DEPTH, mode=Mode.SUBTRACT)


solid = part.part
